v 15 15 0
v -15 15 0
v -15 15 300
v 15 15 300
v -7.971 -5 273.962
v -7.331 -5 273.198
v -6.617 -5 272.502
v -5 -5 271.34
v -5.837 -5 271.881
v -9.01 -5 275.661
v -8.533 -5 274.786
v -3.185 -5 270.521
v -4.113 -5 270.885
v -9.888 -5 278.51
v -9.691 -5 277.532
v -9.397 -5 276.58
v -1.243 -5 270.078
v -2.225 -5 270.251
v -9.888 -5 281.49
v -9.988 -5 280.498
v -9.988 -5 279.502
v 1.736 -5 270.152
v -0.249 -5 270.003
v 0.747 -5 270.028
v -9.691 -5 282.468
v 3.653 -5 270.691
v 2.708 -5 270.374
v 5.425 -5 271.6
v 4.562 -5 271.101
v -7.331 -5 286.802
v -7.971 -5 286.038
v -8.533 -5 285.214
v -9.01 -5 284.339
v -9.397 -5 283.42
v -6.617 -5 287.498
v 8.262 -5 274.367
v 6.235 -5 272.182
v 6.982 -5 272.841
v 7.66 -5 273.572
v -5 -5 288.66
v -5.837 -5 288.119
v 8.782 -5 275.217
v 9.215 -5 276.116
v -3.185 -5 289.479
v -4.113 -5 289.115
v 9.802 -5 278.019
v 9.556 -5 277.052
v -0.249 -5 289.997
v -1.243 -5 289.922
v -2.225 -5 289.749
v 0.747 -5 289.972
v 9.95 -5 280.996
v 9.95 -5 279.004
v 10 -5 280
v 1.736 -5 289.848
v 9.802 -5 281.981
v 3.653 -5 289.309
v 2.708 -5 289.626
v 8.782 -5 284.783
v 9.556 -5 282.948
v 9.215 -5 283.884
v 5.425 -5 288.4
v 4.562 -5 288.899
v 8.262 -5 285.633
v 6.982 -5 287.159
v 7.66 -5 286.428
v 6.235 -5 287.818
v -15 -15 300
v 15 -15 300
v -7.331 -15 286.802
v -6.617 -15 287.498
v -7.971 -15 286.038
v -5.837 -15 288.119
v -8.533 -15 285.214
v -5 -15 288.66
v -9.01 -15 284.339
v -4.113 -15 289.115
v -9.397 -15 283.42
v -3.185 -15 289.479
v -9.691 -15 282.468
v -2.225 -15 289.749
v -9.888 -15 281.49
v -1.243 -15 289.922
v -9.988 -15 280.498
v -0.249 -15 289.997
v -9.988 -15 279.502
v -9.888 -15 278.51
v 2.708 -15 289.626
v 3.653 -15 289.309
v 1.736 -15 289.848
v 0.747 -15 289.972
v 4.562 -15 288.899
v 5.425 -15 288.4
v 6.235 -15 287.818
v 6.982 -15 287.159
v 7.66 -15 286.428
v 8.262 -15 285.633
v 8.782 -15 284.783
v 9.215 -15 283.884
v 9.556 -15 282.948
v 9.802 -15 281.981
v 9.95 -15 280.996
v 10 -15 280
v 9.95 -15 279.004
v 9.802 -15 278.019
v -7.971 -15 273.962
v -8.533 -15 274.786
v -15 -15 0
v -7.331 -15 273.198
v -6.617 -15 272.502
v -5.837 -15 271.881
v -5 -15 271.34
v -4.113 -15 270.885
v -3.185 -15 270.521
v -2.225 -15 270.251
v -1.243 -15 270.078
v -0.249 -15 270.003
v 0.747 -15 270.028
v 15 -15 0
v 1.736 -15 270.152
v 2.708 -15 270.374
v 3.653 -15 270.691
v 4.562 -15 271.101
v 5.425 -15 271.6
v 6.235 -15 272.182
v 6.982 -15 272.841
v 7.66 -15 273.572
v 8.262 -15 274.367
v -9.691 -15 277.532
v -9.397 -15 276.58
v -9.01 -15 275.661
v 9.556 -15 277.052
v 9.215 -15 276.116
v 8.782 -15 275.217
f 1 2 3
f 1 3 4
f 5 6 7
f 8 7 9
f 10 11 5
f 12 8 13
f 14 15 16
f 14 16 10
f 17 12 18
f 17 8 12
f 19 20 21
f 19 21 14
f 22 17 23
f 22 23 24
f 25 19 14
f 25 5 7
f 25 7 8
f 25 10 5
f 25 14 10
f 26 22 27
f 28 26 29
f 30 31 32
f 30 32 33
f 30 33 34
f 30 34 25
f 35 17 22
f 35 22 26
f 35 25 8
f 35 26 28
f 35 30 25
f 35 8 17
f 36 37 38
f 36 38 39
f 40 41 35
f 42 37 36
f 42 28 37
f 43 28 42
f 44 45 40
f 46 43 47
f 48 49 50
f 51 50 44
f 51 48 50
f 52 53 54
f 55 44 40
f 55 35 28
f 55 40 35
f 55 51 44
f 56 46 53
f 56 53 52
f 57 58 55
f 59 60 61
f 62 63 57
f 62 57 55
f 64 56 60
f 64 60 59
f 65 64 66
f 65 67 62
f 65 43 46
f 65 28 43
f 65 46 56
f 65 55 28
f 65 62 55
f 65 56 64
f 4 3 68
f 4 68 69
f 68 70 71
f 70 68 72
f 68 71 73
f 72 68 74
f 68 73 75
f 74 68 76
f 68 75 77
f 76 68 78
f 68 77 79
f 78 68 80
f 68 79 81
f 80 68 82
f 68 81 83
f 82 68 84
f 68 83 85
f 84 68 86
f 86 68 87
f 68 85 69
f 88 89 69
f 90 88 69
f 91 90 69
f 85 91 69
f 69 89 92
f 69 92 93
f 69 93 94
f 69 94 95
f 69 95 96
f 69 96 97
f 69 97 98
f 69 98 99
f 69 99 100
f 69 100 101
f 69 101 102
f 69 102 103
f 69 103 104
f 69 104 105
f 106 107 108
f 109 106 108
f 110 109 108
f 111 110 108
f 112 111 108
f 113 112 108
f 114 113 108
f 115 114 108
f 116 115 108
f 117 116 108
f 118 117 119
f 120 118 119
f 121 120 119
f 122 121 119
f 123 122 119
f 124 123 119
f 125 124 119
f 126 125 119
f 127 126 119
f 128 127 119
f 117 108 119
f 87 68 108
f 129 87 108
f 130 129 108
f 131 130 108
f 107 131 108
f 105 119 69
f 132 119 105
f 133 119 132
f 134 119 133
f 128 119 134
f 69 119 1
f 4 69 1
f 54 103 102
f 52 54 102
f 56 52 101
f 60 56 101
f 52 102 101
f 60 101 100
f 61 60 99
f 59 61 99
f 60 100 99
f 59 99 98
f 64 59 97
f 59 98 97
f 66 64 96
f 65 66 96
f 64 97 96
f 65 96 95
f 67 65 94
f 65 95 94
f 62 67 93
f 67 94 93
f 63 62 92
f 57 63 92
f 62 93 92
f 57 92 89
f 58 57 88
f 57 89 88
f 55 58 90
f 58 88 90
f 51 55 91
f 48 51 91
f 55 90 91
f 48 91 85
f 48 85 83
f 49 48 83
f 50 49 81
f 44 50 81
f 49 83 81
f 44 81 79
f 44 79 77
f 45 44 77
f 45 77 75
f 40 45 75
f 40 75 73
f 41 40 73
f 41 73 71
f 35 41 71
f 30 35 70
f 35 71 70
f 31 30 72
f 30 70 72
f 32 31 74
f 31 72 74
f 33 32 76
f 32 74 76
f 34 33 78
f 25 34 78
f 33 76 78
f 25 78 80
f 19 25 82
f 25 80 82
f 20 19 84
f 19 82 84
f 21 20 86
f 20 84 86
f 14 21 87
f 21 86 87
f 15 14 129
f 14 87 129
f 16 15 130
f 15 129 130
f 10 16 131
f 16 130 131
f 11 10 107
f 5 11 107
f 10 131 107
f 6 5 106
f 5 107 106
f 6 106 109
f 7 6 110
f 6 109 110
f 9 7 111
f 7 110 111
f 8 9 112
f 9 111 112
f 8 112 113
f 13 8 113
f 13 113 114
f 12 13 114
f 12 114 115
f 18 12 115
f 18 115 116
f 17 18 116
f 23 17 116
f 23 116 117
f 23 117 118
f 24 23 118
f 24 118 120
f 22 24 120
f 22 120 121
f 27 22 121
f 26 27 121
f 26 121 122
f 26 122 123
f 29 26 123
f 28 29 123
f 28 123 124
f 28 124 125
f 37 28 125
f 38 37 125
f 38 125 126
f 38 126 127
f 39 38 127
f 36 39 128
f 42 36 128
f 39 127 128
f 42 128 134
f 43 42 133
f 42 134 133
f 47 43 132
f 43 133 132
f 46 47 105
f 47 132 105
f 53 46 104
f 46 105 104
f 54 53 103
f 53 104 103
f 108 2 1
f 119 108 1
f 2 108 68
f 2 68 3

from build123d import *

# Parameters (mm, degrees)
SKETCH1_W           = 30
SKETCH1_H           = 30
BOSS_EXTRUDE1_DEPTH = 300
SKETCH2_R           = 10
CUT_EXTRUDE1_DEPTH  = 10


with BuildPart() as part:
    # Sketch1 → Boss-Extrude1 (new body)
    with BuildSketch(Plane.XY):
        Rectangle(SKETCH1_W, SKETCH1_H)
    extrude(amount=BOSS_EXTRUDE1_DEPTH)

    # Sketch2 → Cut-Extrude1 (cut)
    with BuildSketch(Plane.XZ.offset(15)):
        with Locations((0, 280)):
            Circle(SKETCH2_R)
    extrude(amount=-CUT_EXTRUDE1_DEPTH, mode=Mode.SUBTRACT)


solid = part.part
